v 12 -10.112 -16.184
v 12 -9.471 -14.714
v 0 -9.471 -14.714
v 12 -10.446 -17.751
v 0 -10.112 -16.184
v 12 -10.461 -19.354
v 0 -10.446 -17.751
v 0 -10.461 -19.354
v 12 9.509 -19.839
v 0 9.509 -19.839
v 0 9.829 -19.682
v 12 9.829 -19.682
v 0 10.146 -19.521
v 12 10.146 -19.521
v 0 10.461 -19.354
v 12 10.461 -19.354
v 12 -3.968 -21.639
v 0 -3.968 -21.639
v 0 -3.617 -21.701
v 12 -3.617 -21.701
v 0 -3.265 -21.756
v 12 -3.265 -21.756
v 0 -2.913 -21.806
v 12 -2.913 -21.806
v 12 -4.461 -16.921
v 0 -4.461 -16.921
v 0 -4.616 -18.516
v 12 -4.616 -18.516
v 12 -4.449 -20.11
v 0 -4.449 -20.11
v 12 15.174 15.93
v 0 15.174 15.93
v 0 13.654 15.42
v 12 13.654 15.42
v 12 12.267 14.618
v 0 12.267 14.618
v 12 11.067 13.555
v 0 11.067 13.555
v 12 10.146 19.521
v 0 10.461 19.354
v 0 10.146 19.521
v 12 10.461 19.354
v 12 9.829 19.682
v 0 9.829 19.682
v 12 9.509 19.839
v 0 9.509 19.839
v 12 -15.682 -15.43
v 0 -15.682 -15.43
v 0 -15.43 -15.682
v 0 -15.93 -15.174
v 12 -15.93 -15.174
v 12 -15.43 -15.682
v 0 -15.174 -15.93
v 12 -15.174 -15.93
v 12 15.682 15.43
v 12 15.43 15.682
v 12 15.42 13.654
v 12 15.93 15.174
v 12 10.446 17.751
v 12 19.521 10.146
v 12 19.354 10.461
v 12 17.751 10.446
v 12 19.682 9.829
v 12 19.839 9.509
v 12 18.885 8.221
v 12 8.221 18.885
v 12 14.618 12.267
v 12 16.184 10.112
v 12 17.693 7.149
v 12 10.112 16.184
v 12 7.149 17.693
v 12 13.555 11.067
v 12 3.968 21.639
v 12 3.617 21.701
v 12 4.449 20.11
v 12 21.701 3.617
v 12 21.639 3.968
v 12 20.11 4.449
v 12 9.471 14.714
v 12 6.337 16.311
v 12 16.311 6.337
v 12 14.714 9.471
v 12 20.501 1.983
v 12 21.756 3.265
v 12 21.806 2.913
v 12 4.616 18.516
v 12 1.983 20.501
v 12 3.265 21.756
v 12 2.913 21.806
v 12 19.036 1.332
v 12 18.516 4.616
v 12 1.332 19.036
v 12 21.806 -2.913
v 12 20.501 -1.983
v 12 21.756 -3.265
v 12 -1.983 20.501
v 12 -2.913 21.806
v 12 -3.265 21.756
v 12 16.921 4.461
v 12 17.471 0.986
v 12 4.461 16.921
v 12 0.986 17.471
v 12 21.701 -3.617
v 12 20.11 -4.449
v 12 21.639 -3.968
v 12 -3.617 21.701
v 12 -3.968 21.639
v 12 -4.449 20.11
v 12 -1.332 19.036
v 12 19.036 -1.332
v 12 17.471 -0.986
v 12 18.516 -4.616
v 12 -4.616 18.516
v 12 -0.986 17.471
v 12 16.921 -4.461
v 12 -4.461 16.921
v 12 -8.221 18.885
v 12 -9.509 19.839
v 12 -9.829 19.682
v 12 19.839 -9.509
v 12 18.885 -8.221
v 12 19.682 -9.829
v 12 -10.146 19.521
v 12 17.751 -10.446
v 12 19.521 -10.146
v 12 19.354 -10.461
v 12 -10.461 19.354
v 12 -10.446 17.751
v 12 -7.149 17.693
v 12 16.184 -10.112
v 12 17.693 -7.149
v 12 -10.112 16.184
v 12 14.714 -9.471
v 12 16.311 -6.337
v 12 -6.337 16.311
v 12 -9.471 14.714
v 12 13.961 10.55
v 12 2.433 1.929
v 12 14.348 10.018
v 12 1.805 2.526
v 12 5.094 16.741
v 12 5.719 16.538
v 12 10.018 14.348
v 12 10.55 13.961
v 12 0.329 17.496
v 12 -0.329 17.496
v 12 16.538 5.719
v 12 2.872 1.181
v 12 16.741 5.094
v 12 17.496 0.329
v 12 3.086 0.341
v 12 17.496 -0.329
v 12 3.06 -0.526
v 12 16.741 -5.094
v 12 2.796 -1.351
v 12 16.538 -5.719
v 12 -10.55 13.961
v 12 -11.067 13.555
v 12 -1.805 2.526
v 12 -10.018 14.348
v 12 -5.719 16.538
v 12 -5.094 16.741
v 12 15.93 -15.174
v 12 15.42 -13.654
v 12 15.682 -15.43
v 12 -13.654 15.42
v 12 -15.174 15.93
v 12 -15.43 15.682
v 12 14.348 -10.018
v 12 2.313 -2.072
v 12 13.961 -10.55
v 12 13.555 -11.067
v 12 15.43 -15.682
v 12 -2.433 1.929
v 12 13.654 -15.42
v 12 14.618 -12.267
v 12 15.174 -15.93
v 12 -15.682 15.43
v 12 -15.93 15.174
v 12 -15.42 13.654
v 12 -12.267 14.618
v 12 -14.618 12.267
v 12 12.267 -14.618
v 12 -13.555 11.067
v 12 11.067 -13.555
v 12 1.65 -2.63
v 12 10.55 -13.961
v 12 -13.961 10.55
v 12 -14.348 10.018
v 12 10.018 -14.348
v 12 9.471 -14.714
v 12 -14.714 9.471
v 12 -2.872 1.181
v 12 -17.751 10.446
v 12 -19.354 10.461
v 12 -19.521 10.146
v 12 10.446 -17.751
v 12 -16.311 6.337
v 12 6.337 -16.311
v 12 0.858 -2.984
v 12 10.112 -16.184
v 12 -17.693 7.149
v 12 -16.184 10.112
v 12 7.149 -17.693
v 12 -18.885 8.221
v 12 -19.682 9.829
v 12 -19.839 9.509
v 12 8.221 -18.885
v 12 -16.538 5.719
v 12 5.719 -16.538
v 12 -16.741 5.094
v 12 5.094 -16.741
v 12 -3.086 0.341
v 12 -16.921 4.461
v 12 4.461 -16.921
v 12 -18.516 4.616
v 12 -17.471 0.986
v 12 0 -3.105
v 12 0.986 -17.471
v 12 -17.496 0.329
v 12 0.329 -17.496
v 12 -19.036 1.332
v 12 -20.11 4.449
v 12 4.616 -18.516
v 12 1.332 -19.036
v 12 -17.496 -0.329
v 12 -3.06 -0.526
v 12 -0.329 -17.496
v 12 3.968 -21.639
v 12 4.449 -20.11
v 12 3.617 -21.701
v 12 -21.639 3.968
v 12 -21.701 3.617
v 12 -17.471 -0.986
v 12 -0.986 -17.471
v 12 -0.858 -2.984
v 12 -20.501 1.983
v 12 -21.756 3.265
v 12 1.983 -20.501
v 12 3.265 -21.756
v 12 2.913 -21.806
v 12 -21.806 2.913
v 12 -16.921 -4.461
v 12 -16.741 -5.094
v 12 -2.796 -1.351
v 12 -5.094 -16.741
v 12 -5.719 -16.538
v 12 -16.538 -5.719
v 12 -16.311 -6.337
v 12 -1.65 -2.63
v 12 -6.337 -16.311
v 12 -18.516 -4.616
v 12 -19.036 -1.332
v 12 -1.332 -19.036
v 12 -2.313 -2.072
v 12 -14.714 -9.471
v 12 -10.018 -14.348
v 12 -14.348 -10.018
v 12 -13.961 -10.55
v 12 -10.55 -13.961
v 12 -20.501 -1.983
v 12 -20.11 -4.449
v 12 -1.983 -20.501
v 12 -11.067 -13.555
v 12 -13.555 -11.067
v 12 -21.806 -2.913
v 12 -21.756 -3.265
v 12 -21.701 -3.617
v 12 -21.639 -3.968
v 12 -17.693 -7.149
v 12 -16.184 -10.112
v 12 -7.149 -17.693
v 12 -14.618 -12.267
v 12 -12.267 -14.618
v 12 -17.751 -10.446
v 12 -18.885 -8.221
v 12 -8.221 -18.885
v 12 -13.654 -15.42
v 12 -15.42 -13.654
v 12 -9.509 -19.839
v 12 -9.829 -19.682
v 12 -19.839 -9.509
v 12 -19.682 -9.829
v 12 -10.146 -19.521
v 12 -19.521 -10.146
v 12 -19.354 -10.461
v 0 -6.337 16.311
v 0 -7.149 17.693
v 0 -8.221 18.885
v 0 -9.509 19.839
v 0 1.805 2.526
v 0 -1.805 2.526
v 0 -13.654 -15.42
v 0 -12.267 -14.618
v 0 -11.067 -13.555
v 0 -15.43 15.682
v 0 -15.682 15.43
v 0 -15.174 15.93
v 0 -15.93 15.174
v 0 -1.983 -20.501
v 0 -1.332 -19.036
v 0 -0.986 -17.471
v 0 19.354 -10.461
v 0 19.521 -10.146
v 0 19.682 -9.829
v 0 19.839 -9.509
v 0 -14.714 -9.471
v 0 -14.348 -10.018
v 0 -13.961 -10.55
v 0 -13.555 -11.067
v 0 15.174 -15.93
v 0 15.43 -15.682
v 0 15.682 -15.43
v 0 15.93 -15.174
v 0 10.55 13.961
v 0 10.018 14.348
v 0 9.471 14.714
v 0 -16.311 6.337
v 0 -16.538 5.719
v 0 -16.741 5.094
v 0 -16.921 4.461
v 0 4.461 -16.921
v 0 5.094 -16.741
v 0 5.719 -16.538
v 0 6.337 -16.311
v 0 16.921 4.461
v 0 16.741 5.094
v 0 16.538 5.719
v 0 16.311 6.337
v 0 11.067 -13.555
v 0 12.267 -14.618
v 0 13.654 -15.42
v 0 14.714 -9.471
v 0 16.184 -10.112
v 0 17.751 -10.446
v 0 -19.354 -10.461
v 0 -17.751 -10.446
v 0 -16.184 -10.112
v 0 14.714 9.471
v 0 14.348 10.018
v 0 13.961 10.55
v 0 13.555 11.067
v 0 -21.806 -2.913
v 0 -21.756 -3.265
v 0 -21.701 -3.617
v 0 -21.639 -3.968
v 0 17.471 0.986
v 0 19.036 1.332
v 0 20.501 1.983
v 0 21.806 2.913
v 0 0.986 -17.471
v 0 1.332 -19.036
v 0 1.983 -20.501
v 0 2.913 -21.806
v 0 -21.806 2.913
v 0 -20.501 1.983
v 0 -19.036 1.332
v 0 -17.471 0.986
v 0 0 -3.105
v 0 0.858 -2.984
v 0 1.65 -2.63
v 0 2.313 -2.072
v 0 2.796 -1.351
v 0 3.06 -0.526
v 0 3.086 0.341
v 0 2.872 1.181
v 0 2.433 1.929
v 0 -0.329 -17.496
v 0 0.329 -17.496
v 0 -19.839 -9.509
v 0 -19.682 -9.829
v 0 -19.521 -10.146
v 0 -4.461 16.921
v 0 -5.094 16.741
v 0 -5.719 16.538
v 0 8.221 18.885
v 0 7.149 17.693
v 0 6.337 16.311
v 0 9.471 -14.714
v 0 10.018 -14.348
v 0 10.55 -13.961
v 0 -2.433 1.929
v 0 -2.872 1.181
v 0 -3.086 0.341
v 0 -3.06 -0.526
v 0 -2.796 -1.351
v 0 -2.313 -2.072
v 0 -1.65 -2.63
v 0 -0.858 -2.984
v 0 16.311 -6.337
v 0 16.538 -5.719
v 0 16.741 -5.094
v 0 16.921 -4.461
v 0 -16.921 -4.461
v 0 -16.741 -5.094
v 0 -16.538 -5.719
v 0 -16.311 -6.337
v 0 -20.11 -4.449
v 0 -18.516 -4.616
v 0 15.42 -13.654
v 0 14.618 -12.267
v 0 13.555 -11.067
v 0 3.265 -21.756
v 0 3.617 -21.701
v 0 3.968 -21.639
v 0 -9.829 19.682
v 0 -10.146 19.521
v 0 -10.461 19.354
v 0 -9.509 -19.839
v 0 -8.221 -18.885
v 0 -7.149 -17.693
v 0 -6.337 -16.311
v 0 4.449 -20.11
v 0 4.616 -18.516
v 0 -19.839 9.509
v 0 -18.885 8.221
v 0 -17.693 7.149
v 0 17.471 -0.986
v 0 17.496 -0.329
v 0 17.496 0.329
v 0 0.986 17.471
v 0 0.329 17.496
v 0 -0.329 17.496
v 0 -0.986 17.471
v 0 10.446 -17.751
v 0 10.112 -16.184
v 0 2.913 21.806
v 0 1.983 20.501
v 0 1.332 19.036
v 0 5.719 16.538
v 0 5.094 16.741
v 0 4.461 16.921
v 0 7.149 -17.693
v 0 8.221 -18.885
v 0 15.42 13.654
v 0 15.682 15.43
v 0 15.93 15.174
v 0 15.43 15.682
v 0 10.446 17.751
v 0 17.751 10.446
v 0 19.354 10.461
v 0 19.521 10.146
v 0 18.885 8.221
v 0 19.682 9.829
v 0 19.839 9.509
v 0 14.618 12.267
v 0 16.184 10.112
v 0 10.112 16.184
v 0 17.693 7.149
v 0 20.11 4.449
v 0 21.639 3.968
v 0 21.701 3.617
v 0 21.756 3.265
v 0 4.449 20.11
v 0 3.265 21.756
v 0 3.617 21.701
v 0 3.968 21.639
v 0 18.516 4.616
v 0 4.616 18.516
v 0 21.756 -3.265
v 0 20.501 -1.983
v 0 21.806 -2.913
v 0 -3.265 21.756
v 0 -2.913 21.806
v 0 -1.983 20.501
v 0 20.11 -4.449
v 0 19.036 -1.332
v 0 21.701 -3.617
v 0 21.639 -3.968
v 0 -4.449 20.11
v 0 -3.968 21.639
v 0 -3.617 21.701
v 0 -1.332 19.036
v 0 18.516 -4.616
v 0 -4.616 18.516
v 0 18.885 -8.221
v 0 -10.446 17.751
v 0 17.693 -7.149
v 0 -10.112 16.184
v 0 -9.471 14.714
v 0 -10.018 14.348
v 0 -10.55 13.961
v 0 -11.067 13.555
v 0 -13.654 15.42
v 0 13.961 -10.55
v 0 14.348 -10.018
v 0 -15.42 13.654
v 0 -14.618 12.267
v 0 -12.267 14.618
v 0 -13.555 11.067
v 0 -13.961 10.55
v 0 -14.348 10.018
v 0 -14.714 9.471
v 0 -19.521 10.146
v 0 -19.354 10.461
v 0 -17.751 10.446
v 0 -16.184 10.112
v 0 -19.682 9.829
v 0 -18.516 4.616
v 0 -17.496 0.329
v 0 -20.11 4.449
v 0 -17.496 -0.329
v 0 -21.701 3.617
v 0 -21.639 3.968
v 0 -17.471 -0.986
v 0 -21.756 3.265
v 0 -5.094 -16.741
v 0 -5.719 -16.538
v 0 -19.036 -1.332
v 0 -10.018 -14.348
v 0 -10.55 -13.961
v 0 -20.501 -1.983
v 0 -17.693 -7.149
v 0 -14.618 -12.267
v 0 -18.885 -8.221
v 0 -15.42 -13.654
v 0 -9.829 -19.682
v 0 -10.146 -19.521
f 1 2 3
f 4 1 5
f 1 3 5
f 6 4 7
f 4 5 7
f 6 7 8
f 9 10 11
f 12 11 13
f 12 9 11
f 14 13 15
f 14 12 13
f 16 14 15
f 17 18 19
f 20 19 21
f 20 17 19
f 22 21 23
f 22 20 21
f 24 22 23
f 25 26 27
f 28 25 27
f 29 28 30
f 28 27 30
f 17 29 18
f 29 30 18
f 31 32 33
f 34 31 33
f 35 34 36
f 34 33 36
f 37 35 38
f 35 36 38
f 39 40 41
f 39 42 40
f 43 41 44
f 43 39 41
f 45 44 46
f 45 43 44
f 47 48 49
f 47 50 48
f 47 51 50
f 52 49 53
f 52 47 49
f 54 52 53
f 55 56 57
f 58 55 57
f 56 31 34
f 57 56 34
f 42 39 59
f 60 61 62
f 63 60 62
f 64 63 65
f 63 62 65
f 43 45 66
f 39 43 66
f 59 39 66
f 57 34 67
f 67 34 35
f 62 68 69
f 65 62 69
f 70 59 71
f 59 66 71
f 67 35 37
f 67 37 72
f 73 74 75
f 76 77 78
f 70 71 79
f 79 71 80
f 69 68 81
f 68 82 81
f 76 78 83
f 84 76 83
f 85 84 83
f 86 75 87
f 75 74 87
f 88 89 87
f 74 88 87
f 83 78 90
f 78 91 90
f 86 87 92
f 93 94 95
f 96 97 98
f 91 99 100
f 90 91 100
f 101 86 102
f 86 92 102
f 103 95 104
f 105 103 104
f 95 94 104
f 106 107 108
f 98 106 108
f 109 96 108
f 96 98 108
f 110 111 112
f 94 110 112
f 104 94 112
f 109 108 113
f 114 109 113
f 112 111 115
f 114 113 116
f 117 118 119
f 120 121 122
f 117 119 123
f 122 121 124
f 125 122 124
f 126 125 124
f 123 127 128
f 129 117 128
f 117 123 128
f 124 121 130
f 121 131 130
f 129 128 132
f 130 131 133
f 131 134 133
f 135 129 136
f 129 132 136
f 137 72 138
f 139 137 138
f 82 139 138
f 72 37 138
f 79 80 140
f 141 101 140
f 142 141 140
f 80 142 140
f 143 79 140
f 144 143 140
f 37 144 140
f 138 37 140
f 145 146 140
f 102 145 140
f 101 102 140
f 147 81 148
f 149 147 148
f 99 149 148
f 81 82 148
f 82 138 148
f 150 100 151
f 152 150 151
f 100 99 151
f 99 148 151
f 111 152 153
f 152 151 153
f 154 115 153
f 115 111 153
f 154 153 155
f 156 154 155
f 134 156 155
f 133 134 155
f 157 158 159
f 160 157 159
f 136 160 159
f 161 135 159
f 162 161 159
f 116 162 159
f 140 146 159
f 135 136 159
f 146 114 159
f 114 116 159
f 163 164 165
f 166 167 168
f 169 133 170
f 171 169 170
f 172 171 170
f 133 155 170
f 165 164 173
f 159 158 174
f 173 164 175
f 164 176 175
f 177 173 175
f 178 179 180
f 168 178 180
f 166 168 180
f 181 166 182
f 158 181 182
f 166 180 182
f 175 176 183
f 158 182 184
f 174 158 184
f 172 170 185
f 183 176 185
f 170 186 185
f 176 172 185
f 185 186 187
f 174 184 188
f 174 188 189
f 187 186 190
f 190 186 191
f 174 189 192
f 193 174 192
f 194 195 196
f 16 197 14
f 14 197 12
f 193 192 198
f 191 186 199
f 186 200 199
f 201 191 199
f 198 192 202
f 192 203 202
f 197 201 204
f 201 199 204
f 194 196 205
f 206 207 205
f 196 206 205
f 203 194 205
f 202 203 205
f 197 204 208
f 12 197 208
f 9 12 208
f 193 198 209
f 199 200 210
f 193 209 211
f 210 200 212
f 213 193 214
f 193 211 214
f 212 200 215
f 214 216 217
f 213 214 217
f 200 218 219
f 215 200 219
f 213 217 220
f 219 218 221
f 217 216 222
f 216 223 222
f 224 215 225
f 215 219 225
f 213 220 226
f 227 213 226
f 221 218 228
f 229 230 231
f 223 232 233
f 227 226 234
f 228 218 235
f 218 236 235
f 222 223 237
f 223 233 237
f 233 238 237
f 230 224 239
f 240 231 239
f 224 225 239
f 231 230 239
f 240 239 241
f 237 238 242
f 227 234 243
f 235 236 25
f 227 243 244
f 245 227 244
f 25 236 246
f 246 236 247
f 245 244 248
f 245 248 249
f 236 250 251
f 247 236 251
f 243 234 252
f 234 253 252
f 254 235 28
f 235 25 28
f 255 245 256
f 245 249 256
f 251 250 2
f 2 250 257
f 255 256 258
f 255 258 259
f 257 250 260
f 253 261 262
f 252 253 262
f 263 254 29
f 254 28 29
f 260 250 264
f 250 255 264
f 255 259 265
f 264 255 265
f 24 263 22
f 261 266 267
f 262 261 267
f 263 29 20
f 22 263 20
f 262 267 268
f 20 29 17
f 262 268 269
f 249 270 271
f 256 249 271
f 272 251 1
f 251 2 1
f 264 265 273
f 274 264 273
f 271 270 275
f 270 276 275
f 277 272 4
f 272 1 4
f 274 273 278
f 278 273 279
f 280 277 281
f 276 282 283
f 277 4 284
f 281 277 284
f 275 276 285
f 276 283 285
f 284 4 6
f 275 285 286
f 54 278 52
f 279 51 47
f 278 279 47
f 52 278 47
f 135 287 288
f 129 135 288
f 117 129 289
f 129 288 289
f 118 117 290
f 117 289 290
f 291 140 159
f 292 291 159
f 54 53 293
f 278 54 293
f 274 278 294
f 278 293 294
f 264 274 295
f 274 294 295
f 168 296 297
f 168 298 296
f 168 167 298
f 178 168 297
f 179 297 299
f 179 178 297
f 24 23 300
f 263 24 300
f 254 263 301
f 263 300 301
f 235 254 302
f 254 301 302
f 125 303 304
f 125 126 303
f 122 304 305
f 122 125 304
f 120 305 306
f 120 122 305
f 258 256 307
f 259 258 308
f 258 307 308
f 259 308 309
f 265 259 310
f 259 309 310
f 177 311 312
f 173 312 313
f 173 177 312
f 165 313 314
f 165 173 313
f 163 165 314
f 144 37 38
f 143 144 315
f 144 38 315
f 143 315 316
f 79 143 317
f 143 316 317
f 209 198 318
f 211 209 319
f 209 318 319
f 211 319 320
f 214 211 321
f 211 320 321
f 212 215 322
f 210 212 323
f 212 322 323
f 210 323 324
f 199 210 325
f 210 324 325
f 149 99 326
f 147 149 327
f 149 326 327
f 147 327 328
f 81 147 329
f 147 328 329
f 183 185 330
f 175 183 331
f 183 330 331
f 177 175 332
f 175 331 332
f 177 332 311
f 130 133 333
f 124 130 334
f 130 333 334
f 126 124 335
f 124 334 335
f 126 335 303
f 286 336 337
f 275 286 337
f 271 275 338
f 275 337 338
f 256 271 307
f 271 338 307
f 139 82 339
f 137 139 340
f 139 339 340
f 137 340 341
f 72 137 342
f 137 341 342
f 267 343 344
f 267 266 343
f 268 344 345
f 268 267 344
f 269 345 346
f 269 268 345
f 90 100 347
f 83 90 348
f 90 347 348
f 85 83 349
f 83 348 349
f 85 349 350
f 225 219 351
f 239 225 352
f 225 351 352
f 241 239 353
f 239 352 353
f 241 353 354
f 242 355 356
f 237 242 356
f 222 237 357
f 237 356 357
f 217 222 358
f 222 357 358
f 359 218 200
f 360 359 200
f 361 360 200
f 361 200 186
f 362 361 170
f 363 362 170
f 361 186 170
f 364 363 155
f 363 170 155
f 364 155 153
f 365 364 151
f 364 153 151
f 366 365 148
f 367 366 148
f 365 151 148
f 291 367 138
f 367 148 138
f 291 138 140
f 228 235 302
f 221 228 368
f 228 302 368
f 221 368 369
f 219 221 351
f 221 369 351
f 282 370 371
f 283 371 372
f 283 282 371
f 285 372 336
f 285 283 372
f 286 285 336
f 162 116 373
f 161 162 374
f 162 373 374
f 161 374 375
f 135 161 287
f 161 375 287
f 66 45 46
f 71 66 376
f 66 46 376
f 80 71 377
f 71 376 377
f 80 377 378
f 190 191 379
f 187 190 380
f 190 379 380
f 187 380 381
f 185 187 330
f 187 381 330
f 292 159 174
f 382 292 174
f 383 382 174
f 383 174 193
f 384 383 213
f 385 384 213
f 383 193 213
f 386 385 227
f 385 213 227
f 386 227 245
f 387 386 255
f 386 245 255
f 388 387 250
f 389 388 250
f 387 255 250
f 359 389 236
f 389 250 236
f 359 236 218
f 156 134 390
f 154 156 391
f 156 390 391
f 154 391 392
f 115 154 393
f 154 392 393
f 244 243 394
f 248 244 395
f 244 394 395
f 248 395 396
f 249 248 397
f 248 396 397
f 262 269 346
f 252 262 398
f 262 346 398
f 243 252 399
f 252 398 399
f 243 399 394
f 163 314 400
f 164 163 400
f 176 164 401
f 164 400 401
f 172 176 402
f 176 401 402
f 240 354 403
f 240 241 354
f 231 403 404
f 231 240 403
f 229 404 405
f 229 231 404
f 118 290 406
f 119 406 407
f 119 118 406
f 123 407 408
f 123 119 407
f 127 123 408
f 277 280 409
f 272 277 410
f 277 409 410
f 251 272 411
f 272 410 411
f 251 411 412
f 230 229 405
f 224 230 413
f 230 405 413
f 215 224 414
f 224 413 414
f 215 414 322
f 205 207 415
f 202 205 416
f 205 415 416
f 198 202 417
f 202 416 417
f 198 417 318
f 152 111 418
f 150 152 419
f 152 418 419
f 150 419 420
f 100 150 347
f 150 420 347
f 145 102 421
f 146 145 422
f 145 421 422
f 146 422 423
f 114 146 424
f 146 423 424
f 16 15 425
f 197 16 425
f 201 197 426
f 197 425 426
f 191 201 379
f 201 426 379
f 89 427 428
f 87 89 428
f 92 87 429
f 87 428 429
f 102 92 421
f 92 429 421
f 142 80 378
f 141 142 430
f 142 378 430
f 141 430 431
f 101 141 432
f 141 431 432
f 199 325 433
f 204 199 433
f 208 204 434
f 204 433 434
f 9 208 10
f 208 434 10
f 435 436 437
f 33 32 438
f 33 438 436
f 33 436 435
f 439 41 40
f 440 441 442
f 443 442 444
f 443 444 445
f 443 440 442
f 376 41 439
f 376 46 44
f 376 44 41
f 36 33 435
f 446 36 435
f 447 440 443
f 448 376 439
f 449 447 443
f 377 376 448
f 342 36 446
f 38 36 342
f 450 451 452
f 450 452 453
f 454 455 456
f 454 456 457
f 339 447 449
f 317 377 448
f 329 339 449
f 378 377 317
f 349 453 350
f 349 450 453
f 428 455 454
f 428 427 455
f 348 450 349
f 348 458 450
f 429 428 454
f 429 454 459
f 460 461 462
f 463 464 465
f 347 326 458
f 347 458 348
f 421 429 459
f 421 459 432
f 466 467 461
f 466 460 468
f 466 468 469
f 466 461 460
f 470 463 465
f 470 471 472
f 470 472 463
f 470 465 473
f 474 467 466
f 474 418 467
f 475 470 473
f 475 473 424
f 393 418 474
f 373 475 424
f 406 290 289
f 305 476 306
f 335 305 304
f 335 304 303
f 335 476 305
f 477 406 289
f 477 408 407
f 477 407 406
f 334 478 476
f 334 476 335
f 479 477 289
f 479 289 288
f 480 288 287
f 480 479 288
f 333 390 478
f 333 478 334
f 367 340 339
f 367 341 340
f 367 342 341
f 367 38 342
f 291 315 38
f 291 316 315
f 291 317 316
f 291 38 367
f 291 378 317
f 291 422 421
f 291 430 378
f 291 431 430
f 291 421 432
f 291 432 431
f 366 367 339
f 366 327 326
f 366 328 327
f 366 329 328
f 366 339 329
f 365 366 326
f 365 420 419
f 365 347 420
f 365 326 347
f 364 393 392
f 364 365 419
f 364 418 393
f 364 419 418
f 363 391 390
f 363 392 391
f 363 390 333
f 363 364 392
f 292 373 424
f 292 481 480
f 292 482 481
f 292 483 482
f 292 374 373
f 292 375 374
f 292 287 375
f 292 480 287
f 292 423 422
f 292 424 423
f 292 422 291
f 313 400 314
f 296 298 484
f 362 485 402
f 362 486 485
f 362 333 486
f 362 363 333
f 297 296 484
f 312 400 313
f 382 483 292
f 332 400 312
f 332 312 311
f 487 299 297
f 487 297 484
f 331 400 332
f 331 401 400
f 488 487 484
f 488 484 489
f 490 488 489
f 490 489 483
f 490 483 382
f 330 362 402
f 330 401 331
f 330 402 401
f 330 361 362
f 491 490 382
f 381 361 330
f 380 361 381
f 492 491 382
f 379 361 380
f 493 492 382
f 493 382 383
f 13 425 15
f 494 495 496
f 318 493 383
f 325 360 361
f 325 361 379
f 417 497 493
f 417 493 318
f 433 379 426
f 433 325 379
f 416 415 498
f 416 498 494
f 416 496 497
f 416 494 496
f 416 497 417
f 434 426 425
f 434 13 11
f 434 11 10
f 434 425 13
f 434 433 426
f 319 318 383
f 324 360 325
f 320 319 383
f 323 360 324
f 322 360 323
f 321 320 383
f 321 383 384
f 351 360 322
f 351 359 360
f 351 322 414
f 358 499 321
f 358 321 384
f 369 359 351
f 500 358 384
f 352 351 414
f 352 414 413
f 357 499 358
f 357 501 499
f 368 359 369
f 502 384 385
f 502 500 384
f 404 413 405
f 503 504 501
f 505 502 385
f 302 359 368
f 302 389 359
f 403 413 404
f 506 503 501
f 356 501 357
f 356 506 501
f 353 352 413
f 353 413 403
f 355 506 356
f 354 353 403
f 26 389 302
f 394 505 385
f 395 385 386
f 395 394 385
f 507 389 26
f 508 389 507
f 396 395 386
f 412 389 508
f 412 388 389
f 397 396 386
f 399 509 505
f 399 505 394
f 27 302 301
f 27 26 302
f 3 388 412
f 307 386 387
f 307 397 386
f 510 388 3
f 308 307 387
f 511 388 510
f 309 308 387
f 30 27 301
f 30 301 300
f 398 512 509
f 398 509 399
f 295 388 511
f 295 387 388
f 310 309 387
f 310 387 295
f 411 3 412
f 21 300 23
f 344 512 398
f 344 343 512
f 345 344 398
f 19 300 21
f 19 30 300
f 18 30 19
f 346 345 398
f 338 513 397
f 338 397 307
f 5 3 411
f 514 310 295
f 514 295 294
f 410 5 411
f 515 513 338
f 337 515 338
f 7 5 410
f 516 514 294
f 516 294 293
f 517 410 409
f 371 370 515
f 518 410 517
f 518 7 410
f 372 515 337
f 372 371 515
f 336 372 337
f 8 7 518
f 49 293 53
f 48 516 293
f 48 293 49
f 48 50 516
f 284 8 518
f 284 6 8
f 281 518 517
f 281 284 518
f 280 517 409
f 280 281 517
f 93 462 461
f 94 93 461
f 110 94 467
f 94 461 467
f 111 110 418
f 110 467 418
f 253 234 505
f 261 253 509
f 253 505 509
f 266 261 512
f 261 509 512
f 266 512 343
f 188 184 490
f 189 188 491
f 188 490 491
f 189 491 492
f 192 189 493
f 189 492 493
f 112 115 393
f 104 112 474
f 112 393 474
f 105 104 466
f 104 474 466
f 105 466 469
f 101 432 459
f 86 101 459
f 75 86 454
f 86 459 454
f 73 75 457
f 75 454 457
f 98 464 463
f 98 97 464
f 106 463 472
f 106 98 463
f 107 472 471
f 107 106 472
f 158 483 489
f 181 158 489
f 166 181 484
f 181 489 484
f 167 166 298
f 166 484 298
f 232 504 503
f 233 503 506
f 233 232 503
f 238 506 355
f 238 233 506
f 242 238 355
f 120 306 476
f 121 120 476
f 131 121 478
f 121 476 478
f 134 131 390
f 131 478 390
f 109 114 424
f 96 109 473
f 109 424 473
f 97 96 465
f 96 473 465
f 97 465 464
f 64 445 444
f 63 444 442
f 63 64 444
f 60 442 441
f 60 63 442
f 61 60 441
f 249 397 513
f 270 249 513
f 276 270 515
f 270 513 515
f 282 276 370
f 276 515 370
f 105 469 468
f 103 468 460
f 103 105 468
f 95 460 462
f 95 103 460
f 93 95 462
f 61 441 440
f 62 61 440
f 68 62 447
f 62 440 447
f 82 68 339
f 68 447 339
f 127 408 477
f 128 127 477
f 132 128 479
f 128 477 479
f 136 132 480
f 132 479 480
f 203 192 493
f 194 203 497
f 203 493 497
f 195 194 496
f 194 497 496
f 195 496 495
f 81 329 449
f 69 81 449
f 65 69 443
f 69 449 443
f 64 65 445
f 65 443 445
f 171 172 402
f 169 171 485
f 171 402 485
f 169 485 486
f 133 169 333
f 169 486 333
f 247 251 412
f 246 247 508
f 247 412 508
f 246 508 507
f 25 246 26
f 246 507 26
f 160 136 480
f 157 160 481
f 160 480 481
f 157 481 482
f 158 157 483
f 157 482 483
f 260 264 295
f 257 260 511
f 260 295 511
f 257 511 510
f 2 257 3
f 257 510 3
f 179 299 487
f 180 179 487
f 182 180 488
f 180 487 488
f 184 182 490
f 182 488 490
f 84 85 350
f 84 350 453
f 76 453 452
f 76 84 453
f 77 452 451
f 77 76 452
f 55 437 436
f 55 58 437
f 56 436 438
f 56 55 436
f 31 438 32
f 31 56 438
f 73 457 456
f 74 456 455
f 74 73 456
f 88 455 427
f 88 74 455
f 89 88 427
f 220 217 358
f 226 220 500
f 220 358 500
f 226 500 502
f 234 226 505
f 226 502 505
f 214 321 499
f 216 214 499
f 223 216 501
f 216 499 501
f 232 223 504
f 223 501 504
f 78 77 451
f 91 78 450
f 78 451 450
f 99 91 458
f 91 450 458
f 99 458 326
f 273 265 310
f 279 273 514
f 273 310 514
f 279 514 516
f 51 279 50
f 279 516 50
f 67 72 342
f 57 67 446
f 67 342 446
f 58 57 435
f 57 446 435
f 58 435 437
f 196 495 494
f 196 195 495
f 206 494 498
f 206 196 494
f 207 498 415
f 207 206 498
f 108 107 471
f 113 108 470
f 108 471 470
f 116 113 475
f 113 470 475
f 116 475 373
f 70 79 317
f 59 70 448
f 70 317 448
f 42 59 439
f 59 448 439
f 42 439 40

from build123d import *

# Parameters (mm, degrees)
BASPROSKE_W           = 12
BASPROSKE_H           = 22
TOOTHCUT_DEPTH        = 34.346664001
TEETHCUTS_COUNT       = 20
TEETHCUTS_ANGLE       = 342
BORSKE_R              = 0.4
BORE_DEPTH            = 50.0000508
KES_EKSTR_ZYON1_DEPTH = 100


with BuildPart() as part:
    # BasProSke → Base-Revolve (revolve)
    with BuildSketch(Plane(origin=(0, 0, 0), x_dir=(1, 0, 0), z_dir=(0, 1, 0)), mode=Mode.PRIVATE) as base_revolve_sk:
        with Locations((6, 11)):
            Rectangle(BASPROSKE_W, BASPROSKE_H)
    revolve(base_revolve_sk.sketch.rotate(Axis((-10, 0, 0), (1, 0, 0)), 180), axis=Axis((-10, 0, 0), (1, 0, 0)))

    # TooCutSke → ToothCut (cut, through all)
    with BuildSketch(Plane(origin=(0, 0, 0), x_dir=(0, 0, -1), z_dir=(1, 0, 0))):
        with BuildLine():
            ThreePointArc((0.986171591, 17.471189616), (0, 17.499), (-0.986171591, 17.471189616))
            ThreePointArc((-0.986171591, 17.471189616), (-1.626916196, 19.798789858), (-2.932850173, 21.829260982))
            ThreePointArc((-2.932850173, 21.829260982), (0, 22.0254), (2.932850173, 21.829260982))
            ThreePointArc((2.932850173, 21.829260982), (1.626916196, 19.798789858), (0.986171591, 17.471189616))
        make_face()
    toothcut = extrude(amount=TOOTHCUT_DEPTH, mode=Mode.SUBTRACT)

    # TeethCuts: ToothCut ×20 about axis
    teethcuts_axis = Axis((-10, 0, 0), (1, 0, 0))
    for i in range(1, TEETHCUTS_COUNT):
        add(toothcut.rotate(teethcuts_axis, i * TEETHCUTS_ANGLE / (TEETHCUTS_COUNT - 1)), mode=Mode.SUBTRACT)

    # BorSke → Bore (cut, symmetric)
    with BuildSketch(Plane(origin=(0, 0, 0), x_dir=(0, 0, -1), z_dir=(1, 0, 0))):
        with Locations(Location((0, 0, 0), (0, 0, 180))):
            Circle(BORSKE_R)
    extrude(amount=BORE_DEPTH, both=True, mode=Mode.SUBTRACT)

    # Çizim1 → Kes-Ekstrüzyon1 (cut)
    with BuildSketch(Plane(origin=(12, 0, 0), x_dir=(0, 0, -1), z_dir=(1, 0, 0))):
        with BuildLine():
            ThreePointArc((3.105, 0), (0.947725377, 2.956829655), (-2.526459974, 1.805))
            Line((-2.526459974, 1.805), (-2.526459974, -1.805))
            ThreePointArc((-2.526459974, -1.805), (0.947725377, -2.956829655), (3.105, 0))
        make_face()
    extrude(amount=-KES_EKSTR_ZYON1_DEPTH, mode=Mode.SUBTRACT)


solid = part.part
